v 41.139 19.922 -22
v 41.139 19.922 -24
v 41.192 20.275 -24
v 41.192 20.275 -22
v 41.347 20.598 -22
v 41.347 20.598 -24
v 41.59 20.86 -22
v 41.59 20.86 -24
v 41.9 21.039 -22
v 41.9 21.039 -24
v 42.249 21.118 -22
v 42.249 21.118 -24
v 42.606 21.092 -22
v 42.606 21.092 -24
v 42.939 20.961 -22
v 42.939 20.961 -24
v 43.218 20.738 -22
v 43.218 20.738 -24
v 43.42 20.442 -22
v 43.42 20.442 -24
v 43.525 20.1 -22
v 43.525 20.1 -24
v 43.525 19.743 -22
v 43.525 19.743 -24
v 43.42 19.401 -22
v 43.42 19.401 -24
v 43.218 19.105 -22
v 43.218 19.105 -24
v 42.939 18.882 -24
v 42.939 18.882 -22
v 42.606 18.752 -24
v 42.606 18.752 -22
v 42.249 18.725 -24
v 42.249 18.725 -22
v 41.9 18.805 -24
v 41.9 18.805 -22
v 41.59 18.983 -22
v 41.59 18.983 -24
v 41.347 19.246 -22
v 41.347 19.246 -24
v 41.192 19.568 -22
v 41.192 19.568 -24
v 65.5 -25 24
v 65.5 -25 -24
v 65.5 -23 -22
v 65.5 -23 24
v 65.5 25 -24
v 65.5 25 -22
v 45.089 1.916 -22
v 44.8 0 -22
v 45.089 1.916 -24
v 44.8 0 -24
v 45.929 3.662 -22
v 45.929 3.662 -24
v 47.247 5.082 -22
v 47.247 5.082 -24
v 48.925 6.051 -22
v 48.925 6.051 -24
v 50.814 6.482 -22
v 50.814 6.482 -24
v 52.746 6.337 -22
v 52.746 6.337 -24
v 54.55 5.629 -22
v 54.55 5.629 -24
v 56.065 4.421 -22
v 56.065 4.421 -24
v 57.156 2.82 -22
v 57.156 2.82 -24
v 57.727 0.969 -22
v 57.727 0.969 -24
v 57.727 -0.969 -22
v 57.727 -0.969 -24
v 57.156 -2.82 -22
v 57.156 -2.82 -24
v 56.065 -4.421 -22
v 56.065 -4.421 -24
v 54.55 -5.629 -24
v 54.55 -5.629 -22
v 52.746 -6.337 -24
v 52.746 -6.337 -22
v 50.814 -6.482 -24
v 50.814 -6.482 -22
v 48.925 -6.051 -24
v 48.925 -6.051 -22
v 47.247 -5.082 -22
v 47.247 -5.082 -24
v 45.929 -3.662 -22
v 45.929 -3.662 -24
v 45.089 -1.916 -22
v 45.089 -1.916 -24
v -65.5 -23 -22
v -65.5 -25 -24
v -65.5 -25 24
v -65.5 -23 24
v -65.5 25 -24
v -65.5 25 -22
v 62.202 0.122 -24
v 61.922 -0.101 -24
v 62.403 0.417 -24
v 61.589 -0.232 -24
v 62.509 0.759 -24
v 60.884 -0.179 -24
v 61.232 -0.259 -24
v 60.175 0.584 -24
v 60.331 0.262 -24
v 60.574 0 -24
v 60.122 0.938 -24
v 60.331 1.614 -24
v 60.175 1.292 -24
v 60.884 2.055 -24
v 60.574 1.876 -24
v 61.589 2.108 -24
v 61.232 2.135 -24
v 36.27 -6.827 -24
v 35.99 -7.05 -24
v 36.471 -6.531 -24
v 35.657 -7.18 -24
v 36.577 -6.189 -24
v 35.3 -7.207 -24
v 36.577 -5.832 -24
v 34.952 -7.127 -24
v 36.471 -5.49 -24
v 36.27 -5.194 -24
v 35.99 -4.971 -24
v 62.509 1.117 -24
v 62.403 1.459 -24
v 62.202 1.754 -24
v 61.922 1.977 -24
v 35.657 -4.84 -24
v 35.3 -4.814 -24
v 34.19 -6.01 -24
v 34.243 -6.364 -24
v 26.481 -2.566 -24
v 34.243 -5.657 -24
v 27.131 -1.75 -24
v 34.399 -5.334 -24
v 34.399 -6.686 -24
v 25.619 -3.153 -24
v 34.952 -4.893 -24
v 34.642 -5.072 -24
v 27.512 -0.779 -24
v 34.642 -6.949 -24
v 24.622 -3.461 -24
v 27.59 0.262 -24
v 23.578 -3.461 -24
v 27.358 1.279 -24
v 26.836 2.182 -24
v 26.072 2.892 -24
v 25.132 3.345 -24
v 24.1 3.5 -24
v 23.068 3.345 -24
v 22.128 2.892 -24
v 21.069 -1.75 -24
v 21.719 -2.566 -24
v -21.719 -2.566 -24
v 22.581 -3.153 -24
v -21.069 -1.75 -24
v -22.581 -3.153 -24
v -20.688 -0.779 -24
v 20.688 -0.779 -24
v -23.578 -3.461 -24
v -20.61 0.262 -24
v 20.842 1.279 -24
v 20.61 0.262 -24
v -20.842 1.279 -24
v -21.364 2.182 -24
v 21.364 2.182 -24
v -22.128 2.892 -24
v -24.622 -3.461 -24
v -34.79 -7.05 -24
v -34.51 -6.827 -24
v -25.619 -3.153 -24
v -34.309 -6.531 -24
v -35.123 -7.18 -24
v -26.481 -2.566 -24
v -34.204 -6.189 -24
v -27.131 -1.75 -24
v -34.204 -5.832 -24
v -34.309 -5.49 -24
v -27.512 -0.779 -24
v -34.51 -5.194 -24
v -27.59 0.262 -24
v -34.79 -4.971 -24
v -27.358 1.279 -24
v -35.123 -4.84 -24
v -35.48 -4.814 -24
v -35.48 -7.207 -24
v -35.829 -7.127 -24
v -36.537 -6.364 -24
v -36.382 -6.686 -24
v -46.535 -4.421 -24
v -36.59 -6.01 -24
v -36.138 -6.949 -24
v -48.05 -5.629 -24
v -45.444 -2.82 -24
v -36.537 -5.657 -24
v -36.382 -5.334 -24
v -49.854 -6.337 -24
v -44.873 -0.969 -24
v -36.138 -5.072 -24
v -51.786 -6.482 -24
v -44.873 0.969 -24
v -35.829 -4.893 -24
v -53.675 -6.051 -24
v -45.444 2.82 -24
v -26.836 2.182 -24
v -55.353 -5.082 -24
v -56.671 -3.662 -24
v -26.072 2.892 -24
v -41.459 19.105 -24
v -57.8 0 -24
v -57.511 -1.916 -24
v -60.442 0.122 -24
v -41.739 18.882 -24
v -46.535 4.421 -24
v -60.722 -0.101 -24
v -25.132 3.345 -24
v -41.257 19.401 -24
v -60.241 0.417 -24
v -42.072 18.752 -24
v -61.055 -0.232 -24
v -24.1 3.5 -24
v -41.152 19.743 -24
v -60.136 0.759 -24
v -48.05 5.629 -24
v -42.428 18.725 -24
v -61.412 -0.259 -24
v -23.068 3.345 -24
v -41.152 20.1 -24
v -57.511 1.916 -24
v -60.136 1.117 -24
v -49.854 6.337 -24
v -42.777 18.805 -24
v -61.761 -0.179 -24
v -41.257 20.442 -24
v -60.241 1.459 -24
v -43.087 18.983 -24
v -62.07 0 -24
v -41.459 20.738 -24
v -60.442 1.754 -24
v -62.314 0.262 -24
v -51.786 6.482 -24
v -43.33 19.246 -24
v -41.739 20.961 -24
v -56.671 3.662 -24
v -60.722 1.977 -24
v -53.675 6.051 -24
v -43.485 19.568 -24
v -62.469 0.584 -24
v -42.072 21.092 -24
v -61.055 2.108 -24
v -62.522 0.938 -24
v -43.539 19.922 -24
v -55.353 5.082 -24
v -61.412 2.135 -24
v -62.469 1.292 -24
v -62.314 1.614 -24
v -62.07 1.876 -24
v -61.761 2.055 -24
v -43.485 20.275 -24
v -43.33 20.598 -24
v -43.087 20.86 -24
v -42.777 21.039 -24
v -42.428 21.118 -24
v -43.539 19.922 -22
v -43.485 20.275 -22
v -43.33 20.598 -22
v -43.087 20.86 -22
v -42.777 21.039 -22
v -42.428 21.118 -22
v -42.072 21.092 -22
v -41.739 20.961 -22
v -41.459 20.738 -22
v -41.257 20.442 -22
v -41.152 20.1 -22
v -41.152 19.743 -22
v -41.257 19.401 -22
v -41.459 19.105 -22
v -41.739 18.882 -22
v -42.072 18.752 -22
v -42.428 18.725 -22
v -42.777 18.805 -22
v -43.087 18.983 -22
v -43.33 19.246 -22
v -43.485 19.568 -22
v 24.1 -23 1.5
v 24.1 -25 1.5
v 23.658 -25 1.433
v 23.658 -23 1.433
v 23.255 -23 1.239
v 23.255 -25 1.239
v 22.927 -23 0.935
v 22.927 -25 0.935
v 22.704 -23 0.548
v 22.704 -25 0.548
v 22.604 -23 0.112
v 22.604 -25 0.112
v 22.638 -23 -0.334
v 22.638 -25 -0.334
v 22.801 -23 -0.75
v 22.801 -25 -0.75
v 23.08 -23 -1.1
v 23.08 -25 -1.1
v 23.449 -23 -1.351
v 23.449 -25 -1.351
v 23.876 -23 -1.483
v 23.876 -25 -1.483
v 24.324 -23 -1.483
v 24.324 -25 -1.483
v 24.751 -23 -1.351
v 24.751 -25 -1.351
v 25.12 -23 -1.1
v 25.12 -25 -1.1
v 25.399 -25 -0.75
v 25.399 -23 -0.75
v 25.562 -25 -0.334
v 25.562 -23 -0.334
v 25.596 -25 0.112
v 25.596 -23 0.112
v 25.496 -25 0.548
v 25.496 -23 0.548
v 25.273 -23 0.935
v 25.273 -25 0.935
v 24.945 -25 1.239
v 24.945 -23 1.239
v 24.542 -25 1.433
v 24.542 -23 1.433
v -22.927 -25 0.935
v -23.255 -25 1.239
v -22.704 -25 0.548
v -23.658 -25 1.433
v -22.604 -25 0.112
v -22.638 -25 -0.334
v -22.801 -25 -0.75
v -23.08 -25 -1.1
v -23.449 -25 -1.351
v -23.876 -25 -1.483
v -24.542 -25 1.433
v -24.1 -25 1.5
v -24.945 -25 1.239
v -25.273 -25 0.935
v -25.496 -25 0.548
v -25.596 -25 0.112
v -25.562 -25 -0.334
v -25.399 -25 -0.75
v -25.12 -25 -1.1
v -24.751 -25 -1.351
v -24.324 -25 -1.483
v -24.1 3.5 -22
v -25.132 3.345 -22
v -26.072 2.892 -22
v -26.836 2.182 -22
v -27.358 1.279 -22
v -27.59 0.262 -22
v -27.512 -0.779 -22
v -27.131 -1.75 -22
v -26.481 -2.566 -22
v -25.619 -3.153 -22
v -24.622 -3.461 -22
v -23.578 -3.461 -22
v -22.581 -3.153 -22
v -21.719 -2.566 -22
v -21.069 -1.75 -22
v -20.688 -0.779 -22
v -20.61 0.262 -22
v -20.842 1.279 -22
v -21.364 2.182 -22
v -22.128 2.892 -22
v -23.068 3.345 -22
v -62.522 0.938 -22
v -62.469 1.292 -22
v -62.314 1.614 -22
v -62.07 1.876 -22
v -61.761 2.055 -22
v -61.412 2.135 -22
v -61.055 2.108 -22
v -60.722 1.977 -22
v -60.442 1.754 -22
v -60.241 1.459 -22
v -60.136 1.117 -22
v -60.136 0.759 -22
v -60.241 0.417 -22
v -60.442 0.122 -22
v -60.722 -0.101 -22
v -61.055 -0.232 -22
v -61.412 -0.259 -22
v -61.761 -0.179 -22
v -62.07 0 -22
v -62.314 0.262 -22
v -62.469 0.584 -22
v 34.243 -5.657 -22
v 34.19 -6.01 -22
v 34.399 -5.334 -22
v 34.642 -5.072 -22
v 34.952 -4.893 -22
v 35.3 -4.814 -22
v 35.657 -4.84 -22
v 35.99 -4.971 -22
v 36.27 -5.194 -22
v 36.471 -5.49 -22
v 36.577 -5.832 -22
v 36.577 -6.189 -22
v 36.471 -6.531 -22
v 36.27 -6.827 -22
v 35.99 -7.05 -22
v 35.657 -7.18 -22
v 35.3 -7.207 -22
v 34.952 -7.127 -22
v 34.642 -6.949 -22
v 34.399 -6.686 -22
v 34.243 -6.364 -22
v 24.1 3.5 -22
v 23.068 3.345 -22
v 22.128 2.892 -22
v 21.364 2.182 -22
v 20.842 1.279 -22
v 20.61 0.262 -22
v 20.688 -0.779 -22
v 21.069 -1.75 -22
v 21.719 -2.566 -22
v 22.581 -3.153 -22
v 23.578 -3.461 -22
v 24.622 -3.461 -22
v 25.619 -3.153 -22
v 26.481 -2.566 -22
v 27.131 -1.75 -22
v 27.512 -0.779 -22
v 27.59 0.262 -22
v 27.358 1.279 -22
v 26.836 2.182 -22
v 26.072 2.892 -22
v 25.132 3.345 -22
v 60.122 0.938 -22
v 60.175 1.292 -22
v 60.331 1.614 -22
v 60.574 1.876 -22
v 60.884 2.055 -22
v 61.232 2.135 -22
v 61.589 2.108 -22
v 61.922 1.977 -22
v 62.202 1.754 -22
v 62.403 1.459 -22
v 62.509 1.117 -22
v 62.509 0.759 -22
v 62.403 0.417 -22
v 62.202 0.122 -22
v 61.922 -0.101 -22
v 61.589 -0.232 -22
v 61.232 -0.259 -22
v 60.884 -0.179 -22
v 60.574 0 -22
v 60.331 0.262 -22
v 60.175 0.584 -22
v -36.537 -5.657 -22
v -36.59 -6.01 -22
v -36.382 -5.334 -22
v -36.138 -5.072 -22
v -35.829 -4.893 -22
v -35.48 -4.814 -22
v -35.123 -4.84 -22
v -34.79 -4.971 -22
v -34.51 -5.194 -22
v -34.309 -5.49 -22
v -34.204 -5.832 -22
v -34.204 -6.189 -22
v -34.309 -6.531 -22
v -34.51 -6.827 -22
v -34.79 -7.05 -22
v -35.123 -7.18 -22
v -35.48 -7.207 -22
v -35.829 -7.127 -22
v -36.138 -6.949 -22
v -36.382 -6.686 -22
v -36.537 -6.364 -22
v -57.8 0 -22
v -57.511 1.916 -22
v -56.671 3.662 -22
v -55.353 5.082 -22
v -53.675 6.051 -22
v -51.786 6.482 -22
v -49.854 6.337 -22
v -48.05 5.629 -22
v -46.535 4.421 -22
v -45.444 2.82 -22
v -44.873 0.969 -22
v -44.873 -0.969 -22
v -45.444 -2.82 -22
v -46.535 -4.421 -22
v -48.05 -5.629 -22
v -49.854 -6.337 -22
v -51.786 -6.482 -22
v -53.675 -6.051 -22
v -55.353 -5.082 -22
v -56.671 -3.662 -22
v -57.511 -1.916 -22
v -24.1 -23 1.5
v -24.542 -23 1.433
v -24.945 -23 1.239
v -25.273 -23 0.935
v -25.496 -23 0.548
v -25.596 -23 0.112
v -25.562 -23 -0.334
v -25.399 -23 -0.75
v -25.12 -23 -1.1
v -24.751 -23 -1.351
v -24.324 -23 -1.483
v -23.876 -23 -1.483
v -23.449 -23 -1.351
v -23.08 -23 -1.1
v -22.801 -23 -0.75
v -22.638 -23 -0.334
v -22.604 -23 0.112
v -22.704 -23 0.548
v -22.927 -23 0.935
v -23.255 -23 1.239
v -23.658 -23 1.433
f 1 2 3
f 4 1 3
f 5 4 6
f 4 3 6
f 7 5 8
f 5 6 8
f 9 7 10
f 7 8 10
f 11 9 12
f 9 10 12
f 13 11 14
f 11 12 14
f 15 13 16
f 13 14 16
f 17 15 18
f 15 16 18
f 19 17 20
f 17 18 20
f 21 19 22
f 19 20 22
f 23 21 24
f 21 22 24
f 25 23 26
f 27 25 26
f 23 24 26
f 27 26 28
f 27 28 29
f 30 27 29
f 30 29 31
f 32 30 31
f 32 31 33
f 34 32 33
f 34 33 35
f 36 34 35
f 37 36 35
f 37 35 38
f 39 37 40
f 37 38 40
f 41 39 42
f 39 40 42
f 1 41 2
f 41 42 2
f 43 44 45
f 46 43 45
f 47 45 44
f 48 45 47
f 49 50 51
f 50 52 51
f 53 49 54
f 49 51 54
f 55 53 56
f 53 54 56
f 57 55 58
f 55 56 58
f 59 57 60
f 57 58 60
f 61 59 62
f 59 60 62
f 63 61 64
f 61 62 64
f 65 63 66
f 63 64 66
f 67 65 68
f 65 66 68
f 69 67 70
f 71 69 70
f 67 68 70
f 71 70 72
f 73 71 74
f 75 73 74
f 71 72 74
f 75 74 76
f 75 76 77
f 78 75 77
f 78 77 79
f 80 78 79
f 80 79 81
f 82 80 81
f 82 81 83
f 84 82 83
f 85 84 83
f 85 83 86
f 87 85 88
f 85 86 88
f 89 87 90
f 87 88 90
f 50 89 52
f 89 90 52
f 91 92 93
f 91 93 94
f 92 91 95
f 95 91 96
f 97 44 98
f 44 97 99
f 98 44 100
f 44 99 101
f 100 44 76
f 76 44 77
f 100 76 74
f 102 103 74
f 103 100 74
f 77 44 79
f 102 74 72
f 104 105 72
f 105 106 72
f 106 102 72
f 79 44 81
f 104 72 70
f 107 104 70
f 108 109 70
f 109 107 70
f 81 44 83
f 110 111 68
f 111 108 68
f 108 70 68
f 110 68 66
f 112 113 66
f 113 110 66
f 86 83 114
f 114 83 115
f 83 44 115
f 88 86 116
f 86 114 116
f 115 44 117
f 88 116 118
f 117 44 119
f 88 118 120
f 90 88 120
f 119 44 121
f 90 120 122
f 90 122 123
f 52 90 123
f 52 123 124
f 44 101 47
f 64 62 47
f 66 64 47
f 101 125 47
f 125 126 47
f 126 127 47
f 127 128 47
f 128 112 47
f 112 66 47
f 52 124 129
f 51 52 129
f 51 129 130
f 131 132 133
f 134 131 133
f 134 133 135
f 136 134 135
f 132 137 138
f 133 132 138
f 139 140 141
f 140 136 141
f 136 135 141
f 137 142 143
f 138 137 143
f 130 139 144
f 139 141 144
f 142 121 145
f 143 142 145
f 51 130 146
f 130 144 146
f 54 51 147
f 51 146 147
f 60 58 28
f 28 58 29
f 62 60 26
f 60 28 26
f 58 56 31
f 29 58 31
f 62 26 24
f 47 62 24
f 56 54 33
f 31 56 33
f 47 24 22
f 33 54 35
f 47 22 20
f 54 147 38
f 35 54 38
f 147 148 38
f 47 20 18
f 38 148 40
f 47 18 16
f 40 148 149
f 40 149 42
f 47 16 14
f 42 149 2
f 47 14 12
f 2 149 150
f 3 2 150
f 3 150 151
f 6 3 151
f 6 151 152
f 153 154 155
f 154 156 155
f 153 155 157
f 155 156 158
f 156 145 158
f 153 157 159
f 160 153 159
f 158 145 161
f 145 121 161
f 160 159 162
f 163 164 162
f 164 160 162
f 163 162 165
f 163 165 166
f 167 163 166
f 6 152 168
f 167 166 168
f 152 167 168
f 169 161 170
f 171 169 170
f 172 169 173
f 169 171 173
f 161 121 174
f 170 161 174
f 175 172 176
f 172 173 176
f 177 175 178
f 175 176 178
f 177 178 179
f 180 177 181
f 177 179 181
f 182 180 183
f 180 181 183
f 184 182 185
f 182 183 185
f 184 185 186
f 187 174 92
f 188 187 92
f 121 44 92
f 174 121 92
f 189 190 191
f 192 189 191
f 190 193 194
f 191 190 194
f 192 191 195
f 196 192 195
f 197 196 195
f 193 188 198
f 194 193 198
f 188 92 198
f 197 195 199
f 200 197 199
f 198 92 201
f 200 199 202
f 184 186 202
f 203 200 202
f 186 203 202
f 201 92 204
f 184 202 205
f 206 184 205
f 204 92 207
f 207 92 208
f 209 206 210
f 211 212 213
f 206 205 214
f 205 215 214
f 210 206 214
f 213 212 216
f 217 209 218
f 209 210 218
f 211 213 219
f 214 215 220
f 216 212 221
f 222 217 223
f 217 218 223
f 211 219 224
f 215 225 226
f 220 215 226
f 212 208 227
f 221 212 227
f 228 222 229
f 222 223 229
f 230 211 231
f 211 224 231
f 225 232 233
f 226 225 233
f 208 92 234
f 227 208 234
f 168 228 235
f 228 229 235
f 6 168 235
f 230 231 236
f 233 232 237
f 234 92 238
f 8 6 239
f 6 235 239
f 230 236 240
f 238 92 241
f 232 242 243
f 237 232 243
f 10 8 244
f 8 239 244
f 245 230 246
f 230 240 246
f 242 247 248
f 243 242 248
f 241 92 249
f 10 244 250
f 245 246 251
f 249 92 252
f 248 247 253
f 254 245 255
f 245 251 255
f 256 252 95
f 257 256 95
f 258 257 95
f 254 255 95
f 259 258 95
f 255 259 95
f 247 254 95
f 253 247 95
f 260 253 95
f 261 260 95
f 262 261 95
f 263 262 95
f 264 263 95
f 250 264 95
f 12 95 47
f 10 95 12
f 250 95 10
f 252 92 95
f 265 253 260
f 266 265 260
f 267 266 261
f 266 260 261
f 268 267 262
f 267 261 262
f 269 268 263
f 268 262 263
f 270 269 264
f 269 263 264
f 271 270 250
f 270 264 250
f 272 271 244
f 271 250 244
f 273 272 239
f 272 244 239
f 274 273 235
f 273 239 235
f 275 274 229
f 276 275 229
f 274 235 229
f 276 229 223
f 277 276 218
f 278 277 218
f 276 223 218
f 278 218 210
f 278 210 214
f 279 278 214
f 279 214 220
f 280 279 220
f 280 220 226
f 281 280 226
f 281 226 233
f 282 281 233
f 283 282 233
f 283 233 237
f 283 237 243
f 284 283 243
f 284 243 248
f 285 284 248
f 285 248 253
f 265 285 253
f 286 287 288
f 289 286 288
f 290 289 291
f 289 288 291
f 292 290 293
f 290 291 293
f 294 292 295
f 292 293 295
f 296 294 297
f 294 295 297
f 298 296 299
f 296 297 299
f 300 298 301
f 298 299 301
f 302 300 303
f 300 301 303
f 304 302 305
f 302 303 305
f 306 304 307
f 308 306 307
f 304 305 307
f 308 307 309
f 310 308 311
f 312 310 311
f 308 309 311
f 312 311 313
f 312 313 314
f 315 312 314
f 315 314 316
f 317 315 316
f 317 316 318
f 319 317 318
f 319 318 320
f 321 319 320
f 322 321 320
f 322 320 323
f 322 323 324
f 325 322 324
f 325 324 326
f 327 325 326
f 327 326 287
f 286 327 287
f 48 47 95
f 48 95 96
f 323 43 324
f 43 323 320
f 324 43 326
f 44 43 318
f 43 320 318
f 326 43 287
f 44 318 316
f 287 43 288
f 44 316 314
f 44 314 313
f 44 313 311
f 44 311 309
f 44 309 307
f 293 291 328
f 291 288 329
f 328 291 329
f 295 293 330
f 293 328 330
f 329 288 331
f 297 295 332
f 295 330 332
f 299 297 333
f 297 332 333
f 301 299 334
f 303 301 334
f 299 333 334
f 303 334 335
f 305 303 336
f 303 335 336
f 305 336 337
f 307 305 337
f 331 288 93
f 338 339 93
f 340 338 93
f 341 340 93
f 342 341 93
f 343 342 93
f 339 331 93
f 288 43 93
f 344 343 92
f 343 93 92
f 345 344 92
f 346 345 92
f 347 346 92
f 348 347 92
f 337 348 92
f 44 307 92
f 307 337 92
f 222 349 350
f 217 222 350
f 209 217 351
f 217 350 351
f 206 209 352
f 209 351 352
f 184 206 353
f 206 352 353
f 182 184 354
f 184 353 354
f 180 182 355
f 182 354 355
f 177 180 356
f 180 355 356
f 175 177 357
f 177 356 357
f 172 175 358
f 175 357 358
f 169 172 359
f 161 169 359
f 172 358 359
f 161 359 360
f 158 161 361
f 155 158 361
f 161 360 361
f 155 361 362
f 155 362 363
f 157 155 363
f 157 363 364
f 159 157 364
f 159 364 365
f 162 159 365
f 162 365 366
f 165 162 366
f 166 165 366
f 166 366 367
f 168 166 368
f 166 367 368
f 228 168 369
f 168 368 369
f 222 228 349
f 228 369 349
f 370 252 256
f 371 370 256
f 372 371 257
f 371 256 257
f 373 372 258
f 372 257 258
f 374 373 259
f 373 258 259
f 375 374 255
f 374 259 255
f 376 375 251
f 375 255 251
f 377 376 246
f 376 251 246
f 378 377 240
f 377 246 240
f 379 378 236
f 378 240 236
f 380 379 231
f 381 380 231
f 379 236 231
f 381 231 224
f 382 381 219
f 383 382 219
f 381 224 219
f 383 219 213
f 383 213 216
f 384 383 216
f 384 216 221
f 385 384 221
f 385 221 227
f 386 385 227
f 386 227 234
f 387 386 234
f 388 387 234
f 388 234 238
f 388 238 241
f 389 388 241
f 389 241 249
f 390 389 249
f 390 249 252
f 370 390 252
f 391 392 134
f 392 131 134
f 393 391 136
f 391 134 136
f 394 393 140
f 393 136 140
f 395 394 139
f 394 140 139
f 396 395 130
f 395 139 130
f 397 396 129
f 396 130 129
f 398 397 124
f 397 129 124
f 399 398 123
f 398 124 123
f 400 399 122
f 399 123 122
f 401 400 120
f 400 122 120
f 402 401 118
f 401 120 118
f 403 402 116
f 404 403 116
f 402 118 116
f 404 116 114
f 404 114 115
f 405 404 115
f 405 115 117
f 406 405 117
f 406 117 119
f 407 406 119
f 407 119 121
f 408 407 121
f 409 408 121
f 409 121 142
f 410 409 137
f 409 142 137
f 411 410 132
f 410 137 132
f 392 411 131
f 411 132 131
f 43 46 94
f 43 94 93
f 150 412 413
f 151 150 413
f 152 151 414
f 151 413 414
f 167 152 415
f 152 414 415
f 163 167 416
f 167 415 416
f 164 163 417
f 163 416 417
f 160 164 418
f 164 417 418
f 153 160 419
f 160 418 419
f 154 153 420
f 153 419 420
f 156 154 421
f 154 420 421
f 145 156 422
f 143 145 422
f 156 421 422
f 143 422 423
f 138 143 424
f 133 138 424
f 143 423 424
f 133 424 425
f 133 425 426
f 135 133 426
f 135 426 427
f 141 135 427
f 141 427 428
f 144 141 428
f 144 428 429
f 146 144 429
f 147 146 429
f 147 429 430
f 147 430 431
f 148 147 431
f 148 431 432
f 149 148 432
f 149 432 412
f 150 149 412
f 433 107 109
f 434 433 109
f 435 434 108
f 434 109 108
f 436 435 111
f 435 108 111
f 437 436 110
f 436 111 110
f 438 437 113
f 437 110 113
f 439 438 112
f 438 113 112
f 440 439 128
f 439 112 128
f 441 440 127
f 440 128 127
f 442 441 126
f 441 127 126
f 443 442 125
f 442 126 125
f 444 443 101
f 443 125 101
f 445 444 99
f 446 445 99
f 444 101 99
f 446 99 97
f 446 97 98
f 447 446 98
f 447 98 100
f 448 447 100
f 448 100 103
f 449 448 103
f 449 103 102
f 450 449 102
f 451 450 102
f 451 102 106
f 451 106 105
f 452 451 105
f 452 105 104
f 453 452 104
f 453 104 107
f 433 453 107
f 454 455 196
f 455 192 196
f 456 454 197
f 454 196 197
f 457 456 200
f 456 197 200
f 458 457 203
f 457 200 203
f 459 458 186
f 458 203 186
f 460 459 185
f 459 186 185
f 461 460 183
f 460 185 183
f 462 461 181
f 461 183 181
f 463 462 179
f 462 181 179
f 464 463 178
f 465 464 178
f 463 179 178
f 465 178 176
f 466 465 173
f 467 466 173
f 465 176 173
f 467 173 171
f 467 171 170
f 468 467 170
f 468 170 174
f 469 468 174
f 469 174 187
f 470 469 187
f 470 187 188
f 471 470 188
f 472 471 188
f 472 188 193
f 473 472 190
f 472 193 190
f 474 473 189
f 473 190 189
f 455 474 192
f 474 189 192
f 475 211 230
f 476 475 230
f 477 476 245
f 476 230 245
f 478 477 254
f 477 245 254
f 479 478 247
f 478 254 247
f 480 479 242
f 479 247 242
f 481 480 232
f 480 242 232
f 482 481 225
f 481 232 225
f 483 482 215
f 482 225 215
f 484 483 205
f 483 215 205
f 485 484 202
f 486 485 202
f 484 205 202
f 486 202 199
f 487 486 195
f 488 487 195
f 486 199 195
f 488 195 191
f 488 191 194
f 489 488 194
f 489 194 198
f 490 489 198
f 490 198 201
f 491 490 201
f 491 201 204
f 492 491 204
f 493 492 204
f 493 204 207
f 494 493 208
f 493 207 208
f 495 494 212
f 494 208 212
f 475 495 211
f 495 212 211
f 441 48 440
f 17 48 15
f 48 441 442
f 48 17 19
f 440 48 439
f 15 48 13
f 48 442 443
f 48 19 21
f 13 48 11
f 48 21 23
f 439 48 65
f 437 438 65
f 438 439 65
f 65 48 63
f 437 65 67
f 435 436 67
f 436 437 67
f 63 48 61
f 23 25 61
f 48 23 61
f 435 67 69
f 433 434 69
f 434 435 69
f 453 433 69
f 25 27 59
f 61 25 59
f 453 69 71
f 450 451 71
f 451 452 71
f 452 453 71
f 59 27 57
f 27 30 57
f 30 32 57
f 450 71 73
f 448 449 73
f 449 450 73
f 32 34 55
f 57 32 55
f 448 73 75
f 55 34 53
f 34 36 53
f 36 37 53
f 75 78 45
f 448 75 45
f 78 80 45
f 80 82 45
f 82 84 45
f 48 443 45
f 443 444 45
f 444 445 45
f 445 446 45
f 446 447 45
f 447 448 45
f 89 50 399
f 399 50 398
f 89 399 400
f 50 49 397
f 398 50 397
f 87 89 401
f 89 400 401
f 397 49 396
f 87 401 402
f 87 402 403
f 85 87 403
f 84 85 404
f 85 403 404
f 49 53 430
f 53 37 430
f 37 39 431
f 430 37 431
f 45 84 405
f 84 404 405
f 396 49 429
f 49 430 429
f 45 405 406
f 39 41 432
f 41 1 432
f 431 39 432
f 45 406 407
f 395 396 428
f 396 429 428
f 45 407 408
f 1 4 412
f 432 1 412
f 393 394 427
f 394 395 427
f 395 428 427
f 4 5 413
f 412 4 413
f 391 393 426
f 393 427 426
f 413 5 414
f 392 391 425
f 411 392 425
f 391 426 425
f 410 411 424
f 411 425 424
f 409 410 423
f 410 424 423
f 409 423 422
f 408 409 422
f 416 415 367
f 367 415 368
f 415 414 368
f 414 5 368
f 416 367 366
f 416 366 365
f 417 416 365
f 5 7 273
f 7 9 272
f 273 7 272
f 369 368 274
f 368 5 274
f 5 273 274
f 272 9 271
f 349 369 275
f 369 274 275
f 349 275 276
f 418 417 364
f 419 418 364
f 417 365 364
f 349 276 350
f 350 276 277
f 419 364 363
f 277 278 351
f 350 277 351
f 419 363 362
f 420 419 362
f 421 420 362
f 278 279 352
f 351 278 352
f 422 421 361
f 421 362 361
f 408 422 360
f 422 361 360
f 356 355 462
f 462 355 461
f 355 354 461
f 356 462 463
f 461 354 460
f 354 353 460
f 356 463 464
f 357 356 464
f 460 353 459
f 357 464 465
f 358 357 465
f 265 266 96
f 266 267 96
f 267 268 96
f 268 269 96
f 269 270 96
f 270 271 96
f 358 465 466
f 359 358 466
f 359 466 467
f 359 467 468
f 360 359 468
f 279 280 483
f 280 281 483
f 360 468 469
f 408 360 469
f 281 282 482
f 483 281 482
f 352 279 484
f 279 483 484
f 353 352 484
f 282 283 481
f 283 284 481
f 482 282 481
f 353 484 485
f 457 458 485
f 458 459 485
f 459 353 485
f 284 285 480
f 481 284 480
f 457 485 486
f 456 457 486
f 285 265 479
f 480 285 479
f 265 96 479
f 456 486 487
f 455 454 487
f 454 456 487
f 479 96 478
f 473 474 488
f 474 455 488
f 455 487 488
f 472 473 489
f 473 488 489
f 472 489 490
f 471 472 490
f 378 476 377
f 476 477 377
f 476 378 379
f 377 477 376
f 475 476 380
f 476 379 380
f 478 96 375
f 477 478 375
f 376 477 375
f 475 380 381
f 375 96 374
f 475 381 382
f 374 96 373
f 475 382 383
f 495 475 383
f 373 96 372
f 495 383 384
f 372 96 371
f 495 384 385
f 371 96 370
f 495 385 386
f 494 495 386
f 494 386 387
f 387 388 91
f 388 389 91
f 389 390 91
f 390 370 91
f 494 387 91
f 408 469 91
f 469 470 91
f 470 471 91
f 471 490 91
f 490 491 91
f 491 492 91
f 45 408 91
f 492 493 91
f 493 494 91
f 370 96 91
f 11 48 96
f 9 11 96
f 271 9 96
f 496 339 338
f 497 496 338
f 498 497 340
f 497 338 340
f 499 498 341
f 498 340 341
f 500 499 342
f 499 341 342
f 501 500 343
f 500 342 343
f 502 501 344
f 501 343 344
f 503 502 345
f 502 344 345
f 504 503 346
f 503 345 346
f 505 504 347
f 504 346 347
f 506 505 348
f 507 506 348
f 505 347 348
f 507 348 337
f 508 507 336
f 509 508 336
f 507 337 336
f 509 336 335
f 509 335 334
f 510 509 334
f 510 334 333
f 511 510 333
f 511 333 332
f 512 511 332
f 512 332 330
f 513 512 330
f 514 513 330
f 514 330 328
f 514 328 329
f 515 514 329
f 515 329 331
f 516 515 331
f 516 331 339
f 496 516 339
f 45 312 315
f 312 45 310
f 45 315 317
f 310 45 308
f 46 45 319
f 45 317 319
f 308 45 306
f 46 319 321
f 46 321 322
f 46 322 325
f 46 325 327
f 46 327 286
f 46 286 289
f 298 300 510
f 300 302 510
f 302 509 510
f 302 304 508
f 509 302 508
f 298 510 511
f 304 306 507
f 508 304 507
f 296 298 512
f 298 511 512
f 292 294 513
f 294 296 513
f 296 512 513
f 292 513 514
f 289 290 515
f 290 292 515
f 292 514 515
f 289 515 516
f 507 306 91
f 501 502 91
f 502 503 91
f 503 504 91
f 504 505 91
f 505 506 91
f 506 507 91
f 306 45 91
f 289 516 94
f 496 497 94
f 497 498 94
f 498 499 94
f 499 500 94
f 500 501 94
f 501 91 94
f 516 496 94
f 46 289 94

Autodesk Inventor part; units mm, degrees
ref_plane "YZ Plane" through (0, 0, 0) normal (1, 0, 0) x (0, 1, 0)
ref_plane "XZ Plane" through (0, 0, 0) normal (0, 1, 0) x (-1, 0, 0)
ref_plane "XY Plane" through (0, 0, 0) normal (0, 0, 1) x (1, 0, 0)
sketch "Sketch1" plane through (0, 0, 0) normal (1, 0, 0) x (0, 1, 0)
  line L0 (-25, 24) -> (-25, -24)
  line L1 (-25, -24) -> (25, -24)
  line L2 (25, -24) -> (25, -22)
  line L3 (25, -22) -> (-23, -22)
  line L4 (-23, -22) -> (-23, 24)
  line L5 (-23, 24) -> (-25, 24)
extrude "Extrusion1" add sketch "Sketch1" along normal mid plane 131
sketch "Sketch2" plane through (65.5, 25, -24) normal (0, 0, -1) x (-1, 0, 0)
  circle A0 centre (41.4, -25) radius 3.5
  circle A1 centre (89.6, -25) radius 3.5
  dimension "d17" = 7
  dimension "d18" = 7
hole "Hole1" at (24.1, 0, -24) at (-24.1, 0, -24) direction (0, 0, 1) diameter 7 depth 2
sketch "Sketch3" plane through (65.5, 25, -24) normal (0, 0, -1) x (-1, 0, 0)
  line L0 (65.5, -25) -> (14.2, -25)
  line L1 (65.5, -25) -> (116.8, -25)
  circle A0 centre (14.2, -25) radius 9.5
  circle A1 centre (14.2, -25) radius 1.75
  circle A2 centre (116.8, -25) radius 1.75
  dimension "d26" = 51.3
  dimension "d27" = 51.3
  dimension "d28" = 19
  dimension "d29" = 3.5
  dimension "d30" = 3.5
hole "Hole2" at (51.3, 0, -24) at (-51.3, 0, -24) direction (0, 0, 1) diameter 3.5 depth 2
sketch "Sketch5" plane through (-65.5, -23, 24) normal (0, 1, 0) x (1, 0, 0)
  circle A0 centre (41.4, 24) radius 1.2
  circle A1 centre (89.6, 24) radius 1.2
  dimension "d62" = 2.4
  dimension "d63" = 2.4
hole "Hole4" at (-24.1, -23, 0) at (24.1, -23, 0) direction (0, -1, 0) diameter 3 depth 2
sketch "Sketch7" plane through (65.5, 25, -24) normal (0, 0, -1) x (-1, 0, 0)
  circle A0 centre (14.2, -25) radius 1.75 projected
  circle A1 centre (14.2, -25) radius 3.5
  point P0 (65.5, -25)
  dimension "d89" = 7
extrude "Extrusion3" cut sketch "Sketch7" against normal blind 2
sketch "Sketch8" plane through (65.5, 25, -24) normal (0, 0, -1) x (-1, 0, 0)
  circle A0 centre (14.2, -25) radius 3.5 projected
  line L0 (14.2, -25) -> (39.2, -25) construction
  circle A1 centre (19.1497, -20.0503) radius 18.4
  circle A2 centre (19.1497, -20.0503) radius 15.5
  line L1 (14.2, -25) -> (19.1497, -20.0503)
  line L2 (19.1497, -20.0503) -> (36.8274, -2.3726)
  line L3 (36.8274, -2.3726) -> (1.4721, -37.7279)
  line L4 (6.139, -7.0395) -> (32.1605, -33.061)
  circle A3 centre (8.1896, -9.0901) radius 1.2
  circle A4 centre (30.1099, -31.0104) radius 1.2
  circle A5 centre (23.1614, -5.0784) radius 1.2
  circle A6 centre (4.1779, -24.0619) radius 1.2
  circle A7 centre (15.1381, -35.0221) radius 1.2
  circle A8 centre (34.1216, -16.0386) radius 1.2
  point P0 (65.5, -25)
  dimension "d96" = 31
  dimension "d97" = 25
  dimension "d98" = 180
  dimension "d99" = 50
  dimension "d100" = 2.4
  dimension "d101" = 2.4
  dimension "d104" = 2.4
  dimension "d105" = 2.4
  dimension "d106" = 2.4
  dimension "d107" = 2.4
extrude "Extrusion4" cut sketch "Sketch8" against normal blind 2 contours A3 A2 L4 | L4 A2 A3 | A4 A2 L4 | L4 A2 A4 | A6 A2 | A2 A6 | A7 A2 | A2 A7 | A8 A2 | A2 A8 | A5 A2 | A2 A5 | L4 A3 A2 | A2 A3 L4 | L4 A4 A2 | A2 A4 L4
sketch "Sketch9" plane through (65.5, 25, -24) normal (0, 0, -1) x (-1, 0, 0)
  circle A0 centre (34.1216, -16.0386) radius 1.2 projected
  circle A1 centre (8.1896, -9.0901) radius 1.2 projected
  circle A2 centre (15.1381, -35.0221) radius 1.2 projected
  point P0 (65.5, -25)
extrude "Extrusion6" add sketch "Sketch9" against normal blind 2
sketch "Sketch11" plane through (65.5, 25, -24) normal (0, 0, -1) x (-1, 0, 0)
  circle A0 centre (4.1779, -24.0619) radius 1.2 projected
  circle A1 centre (30.1099, -31.0104) radius 1.2 projected
  circle A2 centre (23.1614, -5.0784) radius 1.2 projected
  circle A3 centre (14.2, -25) radius 3.5 projected
  circle A4 centre (116.8, -25) radius 1.75 projected
  line L0 (65.5, -25) -> (65.5, 0)
  line L1 (0, 0) -> (131, 0) projected
  circle A5 centre (126.8221, -24.0619) radius 1.2
  circle A6 centre (100.8901, -31.0104) radius 1.2
  circle A7 centre (107.8386, -5.0784) radius 1.2
  circle A8 centre (116.8, -25) radius 3.5
extrude "Extrusion7" cut sketch "Sketch11" against normal blind 2 contours A5 | A6 | A7 | A8
sketch "Sketch12" plane through (65.5, 25, -24) normal (0, 0, -1) x (-1, 0, 0)
  circle A0 centre (116.8, -25) radius 3.5 projected
  circle A1 centre (14.2, -25) radius 3.5 projected
  circle A2 centre (14.2, -25) radius 6.5
  circle A3 centre (116.8, -25) radius 6.5
  point P0 (65.5, -25)
  dimension "d116" = 13
  dimension "d117" = 13
extrude "Extrusion8" cut sketch "Sketch12" against normal blind 2
properties part number "drzak_motory"
